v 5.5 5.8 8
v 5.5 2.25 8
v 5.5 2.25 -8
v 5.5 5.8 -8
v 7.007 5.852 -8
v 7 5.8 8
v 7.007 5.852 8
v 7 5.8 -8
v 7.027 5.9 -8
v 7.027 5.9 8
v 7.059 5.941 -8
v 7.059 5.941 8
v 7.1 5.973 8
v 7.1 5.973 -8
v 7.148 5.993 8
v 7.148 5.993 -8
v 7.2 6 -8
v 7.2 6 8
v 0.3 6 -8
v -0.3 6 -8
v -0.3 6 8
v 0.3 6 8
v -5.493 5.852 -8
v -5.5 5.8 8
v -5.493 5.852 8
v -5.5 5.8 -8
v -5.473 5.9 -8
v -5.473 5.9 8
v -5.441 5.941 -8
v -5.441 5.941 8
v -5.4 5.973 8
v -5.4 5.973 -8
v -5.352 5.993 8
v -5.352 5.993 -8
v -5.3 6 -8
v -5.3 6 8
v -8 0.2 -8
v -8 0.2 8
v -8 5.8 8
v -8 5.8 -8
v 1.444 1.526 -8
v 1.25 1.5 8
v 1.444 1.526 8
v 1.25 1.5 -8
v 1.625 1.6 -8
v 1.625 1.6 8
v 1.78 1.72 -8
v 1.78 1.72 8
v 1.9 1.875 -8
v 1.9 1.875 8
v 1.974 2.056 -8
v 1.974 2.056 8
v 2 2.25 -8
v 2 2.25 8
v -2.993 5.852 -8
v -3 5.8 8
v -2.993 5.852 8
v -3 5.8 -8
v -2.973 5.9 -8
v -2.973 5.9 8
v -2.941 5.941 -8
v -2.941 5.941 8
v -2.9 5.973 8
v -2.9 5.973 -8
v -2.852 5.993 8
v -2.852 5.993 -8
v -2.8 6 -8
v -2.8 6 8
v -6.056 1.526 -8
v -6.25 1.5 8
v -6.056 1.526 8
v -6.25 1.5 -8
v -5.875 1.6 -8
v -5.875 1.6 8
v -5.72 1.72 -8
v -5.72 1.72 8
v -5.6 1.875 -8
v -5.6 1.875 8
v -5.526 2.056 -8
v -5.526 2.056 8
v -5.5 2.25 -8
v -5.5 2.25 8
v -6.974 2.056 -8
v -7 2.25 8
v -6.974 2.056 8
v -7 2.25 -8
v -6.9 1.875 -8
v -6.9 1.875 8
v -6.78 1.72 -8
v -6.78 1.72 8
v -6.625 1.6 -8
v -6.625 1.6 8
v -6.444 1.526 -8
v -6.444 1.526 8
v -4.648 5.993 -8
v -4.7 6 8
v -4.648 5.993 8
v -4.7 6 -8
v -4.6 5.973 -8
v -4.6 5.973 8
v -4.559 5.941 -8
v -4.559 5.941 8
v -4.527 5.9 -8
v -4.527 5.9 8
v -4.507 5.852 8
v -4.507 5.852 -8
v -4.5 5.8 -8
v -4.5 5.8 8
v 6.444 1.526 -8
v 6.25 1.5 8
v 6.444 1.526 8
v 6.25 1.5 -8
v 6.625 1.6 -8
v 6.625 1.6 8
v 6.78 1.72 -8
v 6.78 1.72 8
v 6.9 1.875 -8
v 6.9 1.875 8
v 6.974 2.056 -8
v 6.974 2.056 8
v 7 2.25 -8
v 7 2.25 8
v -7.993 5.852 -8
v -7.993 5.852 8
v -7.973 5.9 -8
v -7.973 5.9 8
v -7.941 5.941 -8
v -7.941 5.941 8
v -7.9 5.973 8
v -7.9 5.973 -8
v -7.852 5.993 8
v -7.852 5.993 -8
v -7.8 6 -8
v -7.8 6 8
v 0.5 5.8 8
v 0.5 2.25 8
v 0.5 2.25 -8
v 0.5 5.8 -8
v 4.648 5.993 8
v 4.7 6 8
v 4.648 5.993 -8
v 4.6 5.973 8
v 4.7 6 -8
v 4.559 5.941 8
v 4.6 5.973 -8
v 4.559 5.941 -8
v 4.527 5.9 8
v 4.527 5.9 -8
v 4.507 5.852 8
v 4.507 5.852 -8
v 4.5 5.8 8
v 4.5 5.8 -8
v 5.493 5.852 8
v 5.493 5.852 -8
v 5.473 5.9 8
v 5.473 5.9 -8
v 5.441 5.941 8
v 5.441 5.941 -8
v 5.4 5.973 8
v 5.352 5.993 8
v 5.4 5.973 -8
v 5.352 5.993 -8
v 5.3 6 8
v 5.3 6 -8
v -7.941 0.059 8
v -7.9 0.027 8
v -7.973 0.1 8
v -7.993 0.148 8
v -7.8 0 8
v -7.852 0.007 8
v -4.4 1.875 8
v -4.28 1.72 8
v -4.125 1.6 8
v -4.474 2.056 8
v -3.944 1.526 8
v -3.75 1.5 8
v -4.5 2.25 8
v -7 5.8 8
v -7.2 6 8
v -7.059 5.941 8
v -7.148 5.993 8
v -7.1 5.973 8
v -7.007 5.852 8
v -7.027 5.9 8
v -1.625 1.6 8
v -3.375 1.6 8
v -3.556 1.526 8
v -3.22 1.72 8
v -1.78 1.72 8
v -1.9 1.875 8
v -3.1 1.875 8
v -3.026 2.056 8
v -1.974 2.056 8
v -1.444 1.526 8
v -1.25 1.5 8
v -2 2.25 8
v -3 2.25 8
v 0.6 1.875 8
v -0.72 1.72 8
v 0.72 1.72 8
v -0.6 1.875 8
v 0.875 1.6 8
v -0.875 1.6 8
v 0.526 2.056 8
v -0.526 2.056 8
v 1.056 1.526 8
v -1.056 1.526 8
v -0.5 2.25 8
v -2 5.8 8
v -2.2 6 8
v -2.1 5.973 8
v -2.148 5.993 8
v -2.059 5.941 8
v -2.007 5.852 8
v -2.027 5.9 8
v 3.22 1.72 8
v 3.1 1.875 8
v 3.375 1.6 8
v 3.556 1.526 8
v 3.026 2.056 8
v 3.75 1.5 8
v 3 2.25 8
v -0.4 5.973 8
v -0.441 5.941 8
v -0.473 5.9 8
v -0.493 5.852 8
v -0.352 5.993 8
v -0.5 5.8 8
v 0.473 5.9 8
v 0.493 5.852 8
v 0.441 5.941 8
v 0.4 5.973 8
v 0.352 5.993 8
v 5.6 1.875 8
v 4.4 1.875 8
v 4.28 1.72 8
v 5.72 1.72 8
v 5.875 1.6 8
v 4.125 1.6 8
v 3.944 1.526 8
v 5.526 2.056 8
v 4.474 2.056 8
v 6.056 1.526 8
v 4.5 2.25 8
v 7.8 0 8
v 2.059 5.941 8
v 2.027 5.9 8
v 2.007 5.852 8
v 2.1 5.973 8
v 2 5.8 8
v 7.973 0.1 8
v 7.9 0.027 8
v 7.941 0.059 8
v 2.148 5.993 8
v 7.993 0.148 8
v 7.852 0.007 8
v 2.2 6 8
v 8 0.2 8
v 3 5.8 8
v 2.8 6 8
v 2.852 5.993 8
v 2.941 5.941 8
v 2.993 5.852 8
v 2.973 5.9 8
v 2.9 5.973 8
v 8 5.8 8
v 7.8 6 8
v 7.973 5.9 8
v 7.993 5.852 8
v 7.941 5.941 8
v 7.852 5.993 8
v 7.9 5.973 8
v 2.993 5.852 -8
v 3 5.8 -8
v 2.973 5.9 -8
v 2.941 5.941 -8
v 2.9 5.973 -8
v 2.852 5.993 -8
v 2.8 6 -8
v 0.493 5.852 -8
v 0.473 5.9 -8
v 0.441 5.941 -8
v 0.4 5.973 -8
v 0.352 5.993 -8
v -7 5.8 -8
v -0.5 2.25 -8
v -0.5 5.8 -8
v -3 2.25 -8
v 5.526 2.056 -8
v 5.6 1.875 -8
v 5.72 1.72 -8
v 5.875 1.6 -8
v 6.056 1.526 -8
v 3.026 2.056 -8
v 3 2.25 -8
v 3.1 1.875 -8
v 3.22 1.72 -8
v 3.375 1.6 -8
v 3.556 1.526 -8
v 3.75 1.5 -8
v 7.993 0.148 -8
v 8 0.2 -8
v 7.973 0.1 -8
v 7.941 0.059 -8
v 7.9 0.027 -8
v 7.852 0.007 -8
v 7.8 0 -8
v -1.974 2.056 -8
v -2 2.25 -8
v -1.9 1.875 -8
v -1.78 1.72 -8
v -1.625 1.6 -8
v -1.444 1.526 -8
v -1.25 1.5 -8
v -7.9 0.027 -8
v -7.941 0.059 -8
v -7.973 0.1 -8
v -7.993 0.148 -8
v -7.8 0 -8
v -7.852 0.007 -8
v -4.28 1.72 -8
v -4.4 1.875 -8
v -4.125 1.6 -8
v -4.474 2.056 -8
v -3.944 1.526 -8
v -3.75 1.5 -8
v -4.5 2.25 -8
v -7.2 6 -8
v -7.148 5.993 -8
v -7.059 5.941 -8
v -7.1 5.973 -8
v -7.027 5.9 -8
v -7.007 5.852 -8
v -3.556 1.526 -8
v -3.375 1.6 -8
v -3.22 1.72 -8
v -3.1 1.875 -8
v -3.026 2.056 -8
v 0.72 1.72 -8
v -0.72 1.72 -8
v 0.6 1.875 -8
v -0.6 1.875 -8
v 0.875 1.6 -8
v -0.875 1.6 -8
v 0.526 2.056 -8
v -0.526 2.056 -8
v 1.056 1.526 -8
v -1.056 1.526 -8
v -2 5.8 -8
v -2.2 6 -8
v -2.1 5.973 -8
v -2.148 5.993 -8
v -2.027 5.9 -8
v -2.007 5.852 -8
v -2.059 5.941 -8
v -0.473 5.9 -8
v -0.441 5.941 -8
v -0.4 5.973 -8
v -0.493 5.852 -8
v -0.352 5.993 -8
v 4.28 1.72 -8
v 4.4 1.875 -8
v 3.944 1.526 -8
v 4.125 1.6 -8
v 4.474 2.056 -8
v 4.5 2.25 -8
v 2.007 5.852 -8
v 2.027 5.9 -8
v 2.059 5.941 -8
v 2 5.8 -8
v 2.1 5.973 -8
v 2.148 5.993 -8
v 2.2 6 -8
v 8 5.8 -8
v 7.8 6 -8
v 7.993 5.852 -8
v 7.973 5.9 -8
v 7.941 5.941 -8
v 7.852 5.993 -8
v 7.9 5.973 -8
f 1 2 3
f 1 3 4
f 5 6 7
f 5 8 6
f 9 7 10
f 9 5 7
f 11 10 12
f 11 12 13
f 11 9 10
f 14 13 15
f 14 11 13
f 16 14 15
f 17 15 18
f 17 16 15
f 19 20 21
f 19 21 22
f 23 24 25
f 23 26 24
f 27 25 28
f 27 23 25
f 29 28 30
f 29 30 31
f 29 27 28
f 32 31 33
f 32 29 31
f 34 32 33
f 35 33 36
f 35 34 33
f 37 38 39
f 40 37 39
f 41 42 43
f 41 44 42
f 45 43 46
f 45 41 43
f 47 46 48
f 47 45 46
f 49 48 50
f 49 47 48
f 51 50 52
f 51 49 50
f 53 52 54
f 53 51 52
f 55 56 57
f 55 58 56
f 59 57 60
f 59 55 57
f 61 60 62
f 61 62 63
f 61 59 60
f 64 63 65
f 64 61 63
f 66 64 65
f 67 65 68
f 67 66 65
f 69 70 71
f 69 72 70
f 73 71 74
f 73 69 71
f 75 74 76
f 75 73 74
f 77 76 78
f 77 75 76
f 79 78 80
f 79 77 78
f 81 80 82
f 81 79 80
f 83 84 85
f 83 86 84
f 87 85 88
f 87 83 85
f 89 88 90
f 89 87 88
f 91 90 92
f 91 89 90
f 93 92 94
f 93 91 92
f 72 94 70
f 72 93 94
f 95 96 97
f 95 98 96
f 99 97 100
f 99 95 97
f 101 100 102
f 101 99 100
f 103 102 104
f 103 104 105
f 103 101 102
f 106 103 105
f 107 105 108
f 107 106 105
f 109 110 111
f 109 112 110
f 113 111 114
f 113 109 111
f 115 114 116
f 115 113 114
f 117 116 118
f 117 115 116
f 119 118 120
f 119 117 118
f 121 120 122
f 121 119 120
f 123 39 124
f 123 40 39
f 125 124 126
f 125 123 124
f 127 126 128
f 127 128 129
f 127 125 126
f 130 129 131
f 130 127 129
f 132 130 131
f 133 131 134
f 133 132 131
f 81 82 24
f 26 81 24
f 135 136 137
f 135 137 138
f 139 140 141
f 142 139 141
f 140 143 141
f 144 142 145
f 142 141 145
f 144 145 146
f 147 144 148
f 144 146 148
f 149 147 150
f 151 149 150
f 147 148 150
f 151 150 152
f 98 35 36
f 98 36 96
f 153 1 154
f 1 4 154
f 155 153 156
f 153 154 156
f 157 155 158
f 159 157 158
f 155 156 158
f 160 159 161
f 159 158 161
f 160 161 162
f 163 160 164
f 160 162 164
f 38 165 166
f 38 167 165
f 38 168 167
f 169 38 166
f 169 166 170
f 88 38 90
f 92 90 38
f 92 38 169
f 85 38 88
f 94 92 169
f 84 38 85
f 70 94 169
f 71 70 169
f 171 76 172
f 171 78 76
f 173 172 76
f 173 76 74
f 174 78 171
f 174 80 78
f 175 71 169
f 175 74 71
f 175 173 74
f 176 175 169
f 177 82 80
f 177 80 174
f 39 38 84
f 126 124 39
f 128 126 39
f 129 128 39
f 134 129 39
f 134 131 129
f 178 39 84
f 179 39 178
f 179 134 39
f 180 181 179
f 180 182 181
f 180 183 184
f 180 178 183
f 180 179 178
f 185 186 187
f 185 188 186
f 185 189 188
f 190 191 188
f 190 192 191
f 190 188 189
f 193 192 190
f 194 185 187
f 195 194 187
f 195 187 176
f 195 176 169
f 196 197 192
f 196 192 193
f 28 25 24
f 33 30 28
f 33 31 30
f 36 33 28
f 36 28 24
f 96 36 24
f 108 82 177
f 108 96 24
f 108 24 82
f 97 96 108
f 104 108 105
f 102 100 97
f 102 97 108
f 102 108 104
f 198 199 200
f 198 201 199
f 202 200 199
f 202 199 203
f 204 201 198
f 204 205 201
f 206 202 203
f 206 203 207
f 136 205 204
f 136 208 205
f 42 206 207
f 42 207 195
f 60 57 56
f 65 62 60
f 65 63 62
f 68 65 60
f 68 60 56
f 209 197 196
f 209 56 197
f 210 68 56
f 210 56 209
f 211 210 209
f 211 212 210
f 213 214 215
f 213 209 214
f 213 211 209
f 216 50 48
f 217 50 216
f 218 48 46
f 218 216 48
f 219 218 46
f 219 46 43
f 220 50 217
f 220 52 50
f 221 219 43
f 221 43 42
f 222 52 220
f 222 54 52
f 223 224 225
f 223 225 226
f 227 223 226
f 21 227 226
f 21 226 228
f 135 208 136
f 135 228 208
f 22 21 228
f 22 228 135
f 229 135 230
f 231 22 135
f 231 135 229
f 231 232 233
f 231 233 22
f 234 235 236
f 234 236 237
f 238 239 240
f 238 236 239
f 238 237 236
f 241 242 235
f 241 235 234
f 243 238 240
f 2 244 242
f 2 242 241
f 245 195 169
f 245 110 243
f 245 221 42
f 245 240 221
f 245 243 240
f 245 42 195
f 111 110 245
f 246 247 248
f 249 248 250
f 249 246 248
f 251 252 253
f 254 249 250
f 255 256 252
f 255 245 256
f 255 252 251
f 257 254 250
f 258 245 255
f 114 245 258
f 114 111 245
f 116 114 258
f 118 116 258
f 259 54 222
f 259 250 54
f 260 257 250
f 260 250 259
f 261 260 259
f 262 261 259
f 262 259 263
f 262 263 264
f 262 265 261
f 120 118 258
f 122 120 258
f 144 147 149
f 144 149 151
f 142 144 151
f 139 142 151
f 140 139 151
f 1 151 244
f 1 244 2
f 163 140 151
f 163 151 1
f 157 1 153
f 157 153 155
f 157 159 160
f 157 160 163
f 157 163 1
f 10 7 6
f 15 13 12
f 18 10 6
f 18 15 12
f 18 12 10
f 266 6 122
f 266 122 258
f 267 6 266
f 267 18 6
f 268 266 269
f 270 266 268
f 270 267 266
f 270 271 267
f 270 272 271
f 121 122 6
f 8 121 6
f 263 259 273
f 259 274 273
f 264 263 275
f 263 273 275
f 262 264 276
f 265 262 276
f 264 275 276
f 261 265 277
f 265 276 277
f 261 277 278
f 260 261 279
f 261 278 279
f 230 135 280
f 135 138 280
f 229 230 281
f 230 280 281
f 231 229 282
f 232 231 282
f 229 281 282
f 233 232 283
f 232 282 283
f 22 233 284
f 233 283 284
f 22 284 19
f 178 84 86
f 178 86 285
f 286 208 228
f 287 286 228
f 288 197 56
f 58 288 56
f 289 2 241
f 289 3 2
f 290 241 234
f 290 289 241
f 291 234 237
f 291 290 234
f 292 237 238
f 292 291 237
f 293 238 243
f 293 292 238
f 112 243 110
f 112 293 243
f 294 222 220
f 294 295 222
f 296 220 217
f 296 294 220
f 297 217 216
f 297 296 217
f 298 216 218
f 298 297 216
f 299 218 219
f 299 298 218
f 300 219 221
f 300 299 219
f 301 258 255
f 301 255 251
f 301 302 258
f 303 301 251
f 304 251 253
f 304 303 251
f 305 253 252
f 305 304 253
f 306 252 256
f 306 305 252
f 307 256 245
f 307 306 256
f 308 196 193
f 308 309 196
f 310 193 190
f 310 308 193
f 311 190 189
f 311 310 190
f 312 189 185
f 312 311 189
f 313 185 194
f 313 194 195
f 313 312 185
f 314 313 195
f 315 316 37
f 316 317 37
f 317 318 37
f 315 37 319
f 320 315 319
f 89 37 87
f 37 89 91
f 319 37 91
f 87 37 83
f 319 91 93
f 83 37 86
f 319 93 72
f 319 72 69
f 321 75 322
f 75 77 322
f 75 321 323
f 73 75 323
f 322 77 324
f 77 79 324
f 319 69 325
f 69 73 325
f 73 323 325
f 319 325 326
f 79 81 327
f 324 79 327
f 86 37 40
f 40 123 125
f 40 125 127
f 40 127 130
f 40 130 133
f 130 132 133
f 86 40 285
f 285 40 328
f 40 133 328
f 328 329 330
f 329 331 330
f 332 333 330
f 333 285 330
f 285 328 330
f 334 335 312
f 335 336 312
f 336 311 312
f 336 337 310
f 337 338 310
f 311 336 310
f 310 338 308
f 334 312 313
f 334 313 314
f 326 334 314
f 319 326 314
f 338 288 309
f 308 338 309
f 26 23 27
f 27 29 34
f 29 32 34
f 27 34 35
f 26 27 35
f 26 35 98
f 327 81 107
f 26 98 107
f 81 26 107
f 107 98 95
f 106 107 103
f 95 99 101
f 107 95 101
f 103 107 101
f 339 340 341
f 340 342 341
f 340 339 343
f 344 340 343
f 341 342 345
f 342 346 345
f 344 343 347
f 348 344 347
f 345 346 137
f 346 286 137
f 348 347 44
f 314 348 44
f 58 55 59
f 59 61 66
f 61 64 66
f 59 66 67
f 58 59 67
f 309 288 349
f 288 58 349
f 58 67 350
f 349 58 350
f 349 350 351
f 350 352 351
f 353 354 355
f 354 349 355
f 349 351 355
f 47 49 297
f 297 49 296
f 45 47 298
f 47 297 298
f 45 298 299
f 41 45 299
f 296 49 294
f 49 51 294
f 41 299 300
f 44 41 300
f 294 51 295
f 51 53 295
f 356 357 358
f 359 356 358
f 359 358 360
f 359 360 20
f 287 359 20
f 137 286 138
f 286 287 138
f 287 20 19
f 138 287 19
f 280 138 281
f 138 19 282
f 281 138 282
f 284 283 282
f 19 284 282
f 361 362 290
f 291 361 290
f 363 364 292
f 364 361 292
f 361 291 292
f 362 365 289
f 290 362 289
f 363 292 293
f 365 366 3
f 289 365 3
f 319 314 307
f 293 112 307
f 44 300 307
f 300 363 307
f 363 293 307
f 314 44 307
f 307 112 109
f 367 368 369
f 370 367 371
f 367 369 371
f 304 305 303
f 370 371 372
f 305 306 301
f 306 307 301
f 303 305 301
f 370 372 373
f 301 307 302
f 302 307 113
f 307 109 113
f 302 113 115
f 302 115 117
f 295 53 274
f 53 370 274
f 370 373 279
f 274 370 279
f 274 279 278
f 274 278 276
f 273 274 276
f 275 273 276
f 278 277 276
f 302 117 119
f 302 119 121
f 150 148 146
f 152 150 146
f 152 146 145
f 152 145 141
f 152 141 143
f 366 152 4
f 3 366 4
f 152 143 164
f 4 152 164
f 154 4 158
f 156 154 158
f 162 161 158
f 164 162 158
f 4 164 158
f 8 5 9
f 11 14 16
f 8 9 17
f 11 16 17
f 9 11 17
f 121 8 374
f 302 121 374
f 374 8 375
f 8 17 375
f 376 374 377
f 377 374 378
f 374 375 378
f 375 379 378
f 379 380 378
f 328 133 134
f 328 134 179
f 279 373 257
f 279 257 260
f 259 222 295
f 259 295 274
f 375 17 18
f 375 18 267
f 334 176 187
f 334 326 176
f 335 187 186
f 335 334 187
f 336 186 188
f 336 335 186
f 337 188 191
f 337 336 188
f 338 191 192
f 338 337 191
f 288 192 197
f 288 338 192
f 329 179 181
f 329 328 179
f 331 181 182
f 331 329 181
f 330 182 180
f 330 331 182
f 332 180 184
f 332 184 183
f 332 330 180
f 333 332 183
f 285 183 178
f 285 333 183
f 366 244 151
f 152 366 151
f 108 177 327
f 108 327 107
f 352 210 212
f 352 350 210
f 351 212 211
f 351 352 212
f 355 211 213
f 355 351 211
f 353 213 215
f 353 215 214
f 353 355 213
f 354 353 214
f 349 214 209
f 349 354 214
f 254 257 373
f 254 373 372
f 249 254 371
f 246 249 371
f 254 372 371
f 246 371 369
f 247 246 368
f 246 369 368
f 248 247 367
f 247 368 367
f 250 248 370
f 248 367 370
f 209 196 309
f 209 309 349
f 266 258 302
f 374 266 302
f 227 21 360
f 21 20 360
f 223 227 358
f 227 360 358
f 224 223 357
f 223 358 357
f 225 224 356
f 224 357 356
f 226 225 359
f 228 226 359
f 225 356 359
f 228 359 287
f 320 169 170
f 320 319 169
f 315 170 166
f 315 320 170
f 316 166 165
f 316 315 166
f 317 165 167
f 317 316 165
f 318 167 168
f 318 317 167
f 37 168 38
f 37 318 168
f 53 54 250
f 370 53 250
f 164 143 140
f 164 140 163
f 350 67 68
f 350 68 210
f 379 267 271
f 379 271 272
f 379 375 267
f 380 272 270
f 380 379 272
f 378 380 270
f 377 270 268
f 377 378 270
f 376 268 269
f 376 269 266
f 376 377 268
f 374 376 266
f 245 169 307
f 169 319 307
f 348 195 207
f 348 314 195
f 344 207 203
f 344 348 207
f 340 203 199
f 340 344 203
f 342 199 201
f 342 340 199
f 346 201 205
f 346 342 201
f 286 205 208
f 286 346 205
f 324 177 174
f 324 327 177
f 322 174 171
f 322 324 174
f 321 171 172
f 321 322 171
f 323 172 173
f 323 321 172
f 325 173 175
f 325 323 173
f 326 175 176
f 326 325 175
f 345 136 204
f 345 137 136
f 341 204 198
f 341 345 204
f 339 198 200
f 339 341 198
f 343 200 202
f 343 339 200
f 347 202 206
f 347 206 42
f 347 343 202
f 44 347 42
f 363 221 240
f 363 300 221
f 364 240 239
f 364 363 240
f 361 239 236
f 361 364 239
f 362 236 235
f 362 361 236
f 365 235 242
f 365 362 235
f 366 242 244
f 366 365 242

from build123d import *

# Parameters (mm, degrees)
SKETCH2_W           = 16
SKETCH2_H           = 16
BOSS_EXTRUDE1_DEPTH = 1.5
SKETCH3_W           = 1
SKETCH3_H           = 4.5
BOSS_EXTRUDE2_DEPTH = 16
FILLET1_R           = 0.75
FILLET2_R           = 0.2


with BuildPart() as part:
    # Sketch2 → Boss-Extrude1 (new body)
    with BuildSketch(Plane(origin=(0, 0, 0), x_dir=(1, 0, 0), z_dir=(0, 1, 0))):
        Rectangle(SKETCH2_W, SKETCH2_H)
    extrude(amount=BOSS_EXTRUDE1_DEPTH)

    # Sketch3 → Boss-Extrude2 (add)
    with BuildSketch(Plane.XY.offset(8)):
        with Locations((-7.5, 3.75)):
            Rectangle(SKETCH3_W, SKETCH3_H)
        with Locations((-5, 3.75)):
            Rectangle(SKETCH3_W, SKETCH3_H)
        with Locations((-2.5, 3.75)):
            Rectangle(SKETCH3_W, SKETCH3_H)
        with Locations((0, 3.75)):
            Rectangle(SKETCH3_W, SKETCH3_H)
        with Locations((2.5, 3.75)):
            Rectangle(SKETCH3_W, SKETCH3_H)
        with Locations((5, 3.75)):
            Rectangle(SKETCH3_W, SKETCH3_H)
        with Locations((7.5, 3.75)):
            Rectangle(SKETCH3_W, SKETCH3_H)
    extrude(amount=-BOSS_EXTRUDE2_DEPTH)

    # Fillet1
    fillet1_edges = [part.edges().sort_by_distance(p)[0] for p in [
        (7, 1.5, 0),
        (5.5, 1.5, 0),
        (4.5, 1.5, 0),
        (3, 1.5, 0),
        (2, 1.5, 0),
        (0.5, 1.5, 0),
        (-0.5, 1.5, 0),
        (-2, 1.5, 0),
        (-3, 1.5, 0),
        (-4.5, 1.5, 0),
        (-5.5, 1.5, 0),
        (-7, 1.5, 0),
    ]]
    fillet(fillet1_edges, radius=FILLET1_R - 0.0001)  # a hair under: the kernel refuses the full size

    # Fillet2
    fillet2_edges = [part.edges().sort_by_distance(p)[0] for p in [
        (-7, 6, 0),
        (-8, 6, 0),
        (-4.5, 6, 0),
        (-5.5, 6, 0),
        (-2, 6, 0),
        (-3, 6, 0),
        (0.5, 6, 0),
        (-0.5, 6, 0),
        (-8, 0, 0),
        (3, 6, 0),
        (2, 6, 0),
        (5.5, 6, 0),
        (4.5, 6, 0),
        (8, 0, 0),
        (8, 6, 0),
        (7, 6, 0),
    ]]
    fillet(fillet2_edges, radius=FILLET2_R)


solid = part.part
